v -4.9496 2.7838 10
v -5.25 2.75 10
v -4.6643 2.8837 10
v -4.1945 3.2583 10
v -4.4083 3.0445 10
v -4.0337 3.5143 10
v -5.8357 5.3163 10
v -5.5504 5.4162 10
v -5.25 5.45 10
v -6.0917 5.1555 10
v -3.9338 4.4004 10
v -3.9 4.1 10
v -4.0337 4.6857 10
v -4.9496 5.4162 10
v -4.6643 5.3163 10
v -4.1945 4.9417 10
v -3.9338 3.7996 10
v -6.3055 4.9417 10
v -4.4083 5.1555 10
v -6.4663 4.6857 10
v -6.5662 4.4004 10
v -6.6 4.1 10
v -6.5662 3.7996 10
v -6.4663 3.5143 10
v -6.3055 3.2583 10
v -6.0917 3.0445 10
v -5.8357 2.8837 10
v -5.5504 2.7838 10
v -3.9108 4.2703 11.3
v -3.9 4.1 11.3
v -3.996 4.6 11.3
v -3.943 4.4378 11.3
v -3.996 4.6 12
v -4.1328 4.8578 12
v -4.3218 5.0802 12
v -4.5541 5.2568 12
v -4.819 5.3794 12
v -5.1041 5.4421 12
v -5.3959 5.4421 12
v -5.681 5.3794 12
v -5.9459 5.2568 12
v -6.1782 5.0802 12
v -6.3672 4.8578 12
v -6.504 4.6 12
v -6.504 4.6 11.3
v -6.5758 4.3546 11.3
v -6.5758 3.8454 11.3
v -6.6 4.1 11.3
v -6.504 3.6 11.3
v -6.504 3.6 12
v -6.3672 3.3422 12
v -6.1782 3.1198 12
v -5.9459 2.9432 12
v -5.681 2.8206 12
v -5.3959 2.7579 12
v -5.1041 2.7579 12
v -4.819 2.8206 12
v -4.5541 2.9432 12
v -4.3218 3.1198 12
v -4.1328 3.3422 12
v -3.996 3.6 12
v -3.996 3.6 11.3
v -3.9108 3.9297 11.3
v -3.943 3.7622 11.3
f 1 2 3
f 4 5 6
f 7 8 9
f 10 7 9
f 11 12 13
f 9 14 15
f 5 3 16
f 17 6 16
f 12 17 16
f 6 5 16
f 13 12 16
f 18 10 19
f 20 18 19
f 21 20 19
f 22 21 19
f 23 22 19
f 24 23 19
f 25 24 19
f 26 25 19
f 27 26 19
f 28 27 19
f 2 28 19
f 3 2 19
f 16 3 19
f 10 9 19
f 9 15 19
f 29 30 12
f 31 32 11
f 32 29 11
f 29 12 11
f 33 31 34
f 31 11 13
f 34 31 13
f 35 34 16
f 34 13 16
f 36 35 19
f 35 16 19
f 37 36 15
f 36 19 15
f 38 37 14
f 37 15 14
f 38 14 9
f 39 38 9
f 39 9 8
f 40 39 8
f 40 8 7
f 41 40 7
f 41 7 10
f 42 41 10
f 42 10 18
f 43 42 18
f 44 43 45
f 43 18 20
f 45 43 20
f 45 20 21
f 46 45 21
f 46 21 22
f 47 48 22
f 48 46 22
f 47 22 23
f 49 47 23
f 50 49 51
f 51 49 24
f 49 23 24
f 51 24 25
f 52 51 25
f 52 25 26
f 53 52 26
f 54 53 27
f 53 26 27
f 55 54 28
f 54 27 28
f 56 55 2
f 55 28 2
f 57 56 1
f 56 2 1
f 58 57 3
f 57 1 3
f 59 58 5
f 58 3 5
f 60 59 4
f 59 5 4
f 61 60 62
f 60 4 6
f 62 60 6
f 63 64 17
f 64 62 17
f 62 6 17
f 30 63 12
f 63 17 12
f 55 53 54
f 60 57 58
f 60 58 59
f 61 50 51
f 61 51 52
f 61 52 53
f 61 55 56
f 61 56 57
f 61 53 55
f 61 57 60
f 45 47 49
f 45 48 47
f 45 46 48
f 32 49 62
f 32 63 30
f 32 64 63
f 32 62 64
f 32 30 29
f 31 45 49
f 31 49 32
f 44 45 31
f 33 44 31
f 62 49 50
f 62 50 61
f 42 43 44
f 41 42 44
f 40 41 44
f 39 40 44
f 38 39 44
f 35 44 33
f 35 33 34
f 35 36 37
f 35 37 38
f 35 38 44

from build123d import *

# Parameters (mm, degrees)
BOX008_W          = 3
BOX008_H          = 1
BOX008_DEPTH      = 0.7
CYLINDER004_R     = 1.35
CYLINDER004_DEPTH = 2


with BuildPart() as cube004:
    # Box008 → Box008 (new body)
    with BuildSketch(Plane(origin=(-1.5, -0.5, 1.3), x_dir=(1, 0, 0), z_dir=(0, 0, 1))):
        with Locations((1.5, 0.5)):
            Rectangle(BOX008_W, BOX008_H)
    extrude(amount=BOX008_DEPTH)


with BuildPart() as cut008:
    # Cylinder004 → Cylinder004 (new body)
    with BuildSketch(Plane.XY):
        Circle(CYLINDER004_R)
    extrude(amount=CYLINDER004_DEPTH)

    # Cut008: cut Cube004
    add(cube004.part, mode=Mode.SUBTRACT)


with BuildPart() as cut008_1:
    # Cut008 placement: moved
    add(cut008.part.moved(Location((-5.25, 4.1, 10))))


solid = cut008_1.part
